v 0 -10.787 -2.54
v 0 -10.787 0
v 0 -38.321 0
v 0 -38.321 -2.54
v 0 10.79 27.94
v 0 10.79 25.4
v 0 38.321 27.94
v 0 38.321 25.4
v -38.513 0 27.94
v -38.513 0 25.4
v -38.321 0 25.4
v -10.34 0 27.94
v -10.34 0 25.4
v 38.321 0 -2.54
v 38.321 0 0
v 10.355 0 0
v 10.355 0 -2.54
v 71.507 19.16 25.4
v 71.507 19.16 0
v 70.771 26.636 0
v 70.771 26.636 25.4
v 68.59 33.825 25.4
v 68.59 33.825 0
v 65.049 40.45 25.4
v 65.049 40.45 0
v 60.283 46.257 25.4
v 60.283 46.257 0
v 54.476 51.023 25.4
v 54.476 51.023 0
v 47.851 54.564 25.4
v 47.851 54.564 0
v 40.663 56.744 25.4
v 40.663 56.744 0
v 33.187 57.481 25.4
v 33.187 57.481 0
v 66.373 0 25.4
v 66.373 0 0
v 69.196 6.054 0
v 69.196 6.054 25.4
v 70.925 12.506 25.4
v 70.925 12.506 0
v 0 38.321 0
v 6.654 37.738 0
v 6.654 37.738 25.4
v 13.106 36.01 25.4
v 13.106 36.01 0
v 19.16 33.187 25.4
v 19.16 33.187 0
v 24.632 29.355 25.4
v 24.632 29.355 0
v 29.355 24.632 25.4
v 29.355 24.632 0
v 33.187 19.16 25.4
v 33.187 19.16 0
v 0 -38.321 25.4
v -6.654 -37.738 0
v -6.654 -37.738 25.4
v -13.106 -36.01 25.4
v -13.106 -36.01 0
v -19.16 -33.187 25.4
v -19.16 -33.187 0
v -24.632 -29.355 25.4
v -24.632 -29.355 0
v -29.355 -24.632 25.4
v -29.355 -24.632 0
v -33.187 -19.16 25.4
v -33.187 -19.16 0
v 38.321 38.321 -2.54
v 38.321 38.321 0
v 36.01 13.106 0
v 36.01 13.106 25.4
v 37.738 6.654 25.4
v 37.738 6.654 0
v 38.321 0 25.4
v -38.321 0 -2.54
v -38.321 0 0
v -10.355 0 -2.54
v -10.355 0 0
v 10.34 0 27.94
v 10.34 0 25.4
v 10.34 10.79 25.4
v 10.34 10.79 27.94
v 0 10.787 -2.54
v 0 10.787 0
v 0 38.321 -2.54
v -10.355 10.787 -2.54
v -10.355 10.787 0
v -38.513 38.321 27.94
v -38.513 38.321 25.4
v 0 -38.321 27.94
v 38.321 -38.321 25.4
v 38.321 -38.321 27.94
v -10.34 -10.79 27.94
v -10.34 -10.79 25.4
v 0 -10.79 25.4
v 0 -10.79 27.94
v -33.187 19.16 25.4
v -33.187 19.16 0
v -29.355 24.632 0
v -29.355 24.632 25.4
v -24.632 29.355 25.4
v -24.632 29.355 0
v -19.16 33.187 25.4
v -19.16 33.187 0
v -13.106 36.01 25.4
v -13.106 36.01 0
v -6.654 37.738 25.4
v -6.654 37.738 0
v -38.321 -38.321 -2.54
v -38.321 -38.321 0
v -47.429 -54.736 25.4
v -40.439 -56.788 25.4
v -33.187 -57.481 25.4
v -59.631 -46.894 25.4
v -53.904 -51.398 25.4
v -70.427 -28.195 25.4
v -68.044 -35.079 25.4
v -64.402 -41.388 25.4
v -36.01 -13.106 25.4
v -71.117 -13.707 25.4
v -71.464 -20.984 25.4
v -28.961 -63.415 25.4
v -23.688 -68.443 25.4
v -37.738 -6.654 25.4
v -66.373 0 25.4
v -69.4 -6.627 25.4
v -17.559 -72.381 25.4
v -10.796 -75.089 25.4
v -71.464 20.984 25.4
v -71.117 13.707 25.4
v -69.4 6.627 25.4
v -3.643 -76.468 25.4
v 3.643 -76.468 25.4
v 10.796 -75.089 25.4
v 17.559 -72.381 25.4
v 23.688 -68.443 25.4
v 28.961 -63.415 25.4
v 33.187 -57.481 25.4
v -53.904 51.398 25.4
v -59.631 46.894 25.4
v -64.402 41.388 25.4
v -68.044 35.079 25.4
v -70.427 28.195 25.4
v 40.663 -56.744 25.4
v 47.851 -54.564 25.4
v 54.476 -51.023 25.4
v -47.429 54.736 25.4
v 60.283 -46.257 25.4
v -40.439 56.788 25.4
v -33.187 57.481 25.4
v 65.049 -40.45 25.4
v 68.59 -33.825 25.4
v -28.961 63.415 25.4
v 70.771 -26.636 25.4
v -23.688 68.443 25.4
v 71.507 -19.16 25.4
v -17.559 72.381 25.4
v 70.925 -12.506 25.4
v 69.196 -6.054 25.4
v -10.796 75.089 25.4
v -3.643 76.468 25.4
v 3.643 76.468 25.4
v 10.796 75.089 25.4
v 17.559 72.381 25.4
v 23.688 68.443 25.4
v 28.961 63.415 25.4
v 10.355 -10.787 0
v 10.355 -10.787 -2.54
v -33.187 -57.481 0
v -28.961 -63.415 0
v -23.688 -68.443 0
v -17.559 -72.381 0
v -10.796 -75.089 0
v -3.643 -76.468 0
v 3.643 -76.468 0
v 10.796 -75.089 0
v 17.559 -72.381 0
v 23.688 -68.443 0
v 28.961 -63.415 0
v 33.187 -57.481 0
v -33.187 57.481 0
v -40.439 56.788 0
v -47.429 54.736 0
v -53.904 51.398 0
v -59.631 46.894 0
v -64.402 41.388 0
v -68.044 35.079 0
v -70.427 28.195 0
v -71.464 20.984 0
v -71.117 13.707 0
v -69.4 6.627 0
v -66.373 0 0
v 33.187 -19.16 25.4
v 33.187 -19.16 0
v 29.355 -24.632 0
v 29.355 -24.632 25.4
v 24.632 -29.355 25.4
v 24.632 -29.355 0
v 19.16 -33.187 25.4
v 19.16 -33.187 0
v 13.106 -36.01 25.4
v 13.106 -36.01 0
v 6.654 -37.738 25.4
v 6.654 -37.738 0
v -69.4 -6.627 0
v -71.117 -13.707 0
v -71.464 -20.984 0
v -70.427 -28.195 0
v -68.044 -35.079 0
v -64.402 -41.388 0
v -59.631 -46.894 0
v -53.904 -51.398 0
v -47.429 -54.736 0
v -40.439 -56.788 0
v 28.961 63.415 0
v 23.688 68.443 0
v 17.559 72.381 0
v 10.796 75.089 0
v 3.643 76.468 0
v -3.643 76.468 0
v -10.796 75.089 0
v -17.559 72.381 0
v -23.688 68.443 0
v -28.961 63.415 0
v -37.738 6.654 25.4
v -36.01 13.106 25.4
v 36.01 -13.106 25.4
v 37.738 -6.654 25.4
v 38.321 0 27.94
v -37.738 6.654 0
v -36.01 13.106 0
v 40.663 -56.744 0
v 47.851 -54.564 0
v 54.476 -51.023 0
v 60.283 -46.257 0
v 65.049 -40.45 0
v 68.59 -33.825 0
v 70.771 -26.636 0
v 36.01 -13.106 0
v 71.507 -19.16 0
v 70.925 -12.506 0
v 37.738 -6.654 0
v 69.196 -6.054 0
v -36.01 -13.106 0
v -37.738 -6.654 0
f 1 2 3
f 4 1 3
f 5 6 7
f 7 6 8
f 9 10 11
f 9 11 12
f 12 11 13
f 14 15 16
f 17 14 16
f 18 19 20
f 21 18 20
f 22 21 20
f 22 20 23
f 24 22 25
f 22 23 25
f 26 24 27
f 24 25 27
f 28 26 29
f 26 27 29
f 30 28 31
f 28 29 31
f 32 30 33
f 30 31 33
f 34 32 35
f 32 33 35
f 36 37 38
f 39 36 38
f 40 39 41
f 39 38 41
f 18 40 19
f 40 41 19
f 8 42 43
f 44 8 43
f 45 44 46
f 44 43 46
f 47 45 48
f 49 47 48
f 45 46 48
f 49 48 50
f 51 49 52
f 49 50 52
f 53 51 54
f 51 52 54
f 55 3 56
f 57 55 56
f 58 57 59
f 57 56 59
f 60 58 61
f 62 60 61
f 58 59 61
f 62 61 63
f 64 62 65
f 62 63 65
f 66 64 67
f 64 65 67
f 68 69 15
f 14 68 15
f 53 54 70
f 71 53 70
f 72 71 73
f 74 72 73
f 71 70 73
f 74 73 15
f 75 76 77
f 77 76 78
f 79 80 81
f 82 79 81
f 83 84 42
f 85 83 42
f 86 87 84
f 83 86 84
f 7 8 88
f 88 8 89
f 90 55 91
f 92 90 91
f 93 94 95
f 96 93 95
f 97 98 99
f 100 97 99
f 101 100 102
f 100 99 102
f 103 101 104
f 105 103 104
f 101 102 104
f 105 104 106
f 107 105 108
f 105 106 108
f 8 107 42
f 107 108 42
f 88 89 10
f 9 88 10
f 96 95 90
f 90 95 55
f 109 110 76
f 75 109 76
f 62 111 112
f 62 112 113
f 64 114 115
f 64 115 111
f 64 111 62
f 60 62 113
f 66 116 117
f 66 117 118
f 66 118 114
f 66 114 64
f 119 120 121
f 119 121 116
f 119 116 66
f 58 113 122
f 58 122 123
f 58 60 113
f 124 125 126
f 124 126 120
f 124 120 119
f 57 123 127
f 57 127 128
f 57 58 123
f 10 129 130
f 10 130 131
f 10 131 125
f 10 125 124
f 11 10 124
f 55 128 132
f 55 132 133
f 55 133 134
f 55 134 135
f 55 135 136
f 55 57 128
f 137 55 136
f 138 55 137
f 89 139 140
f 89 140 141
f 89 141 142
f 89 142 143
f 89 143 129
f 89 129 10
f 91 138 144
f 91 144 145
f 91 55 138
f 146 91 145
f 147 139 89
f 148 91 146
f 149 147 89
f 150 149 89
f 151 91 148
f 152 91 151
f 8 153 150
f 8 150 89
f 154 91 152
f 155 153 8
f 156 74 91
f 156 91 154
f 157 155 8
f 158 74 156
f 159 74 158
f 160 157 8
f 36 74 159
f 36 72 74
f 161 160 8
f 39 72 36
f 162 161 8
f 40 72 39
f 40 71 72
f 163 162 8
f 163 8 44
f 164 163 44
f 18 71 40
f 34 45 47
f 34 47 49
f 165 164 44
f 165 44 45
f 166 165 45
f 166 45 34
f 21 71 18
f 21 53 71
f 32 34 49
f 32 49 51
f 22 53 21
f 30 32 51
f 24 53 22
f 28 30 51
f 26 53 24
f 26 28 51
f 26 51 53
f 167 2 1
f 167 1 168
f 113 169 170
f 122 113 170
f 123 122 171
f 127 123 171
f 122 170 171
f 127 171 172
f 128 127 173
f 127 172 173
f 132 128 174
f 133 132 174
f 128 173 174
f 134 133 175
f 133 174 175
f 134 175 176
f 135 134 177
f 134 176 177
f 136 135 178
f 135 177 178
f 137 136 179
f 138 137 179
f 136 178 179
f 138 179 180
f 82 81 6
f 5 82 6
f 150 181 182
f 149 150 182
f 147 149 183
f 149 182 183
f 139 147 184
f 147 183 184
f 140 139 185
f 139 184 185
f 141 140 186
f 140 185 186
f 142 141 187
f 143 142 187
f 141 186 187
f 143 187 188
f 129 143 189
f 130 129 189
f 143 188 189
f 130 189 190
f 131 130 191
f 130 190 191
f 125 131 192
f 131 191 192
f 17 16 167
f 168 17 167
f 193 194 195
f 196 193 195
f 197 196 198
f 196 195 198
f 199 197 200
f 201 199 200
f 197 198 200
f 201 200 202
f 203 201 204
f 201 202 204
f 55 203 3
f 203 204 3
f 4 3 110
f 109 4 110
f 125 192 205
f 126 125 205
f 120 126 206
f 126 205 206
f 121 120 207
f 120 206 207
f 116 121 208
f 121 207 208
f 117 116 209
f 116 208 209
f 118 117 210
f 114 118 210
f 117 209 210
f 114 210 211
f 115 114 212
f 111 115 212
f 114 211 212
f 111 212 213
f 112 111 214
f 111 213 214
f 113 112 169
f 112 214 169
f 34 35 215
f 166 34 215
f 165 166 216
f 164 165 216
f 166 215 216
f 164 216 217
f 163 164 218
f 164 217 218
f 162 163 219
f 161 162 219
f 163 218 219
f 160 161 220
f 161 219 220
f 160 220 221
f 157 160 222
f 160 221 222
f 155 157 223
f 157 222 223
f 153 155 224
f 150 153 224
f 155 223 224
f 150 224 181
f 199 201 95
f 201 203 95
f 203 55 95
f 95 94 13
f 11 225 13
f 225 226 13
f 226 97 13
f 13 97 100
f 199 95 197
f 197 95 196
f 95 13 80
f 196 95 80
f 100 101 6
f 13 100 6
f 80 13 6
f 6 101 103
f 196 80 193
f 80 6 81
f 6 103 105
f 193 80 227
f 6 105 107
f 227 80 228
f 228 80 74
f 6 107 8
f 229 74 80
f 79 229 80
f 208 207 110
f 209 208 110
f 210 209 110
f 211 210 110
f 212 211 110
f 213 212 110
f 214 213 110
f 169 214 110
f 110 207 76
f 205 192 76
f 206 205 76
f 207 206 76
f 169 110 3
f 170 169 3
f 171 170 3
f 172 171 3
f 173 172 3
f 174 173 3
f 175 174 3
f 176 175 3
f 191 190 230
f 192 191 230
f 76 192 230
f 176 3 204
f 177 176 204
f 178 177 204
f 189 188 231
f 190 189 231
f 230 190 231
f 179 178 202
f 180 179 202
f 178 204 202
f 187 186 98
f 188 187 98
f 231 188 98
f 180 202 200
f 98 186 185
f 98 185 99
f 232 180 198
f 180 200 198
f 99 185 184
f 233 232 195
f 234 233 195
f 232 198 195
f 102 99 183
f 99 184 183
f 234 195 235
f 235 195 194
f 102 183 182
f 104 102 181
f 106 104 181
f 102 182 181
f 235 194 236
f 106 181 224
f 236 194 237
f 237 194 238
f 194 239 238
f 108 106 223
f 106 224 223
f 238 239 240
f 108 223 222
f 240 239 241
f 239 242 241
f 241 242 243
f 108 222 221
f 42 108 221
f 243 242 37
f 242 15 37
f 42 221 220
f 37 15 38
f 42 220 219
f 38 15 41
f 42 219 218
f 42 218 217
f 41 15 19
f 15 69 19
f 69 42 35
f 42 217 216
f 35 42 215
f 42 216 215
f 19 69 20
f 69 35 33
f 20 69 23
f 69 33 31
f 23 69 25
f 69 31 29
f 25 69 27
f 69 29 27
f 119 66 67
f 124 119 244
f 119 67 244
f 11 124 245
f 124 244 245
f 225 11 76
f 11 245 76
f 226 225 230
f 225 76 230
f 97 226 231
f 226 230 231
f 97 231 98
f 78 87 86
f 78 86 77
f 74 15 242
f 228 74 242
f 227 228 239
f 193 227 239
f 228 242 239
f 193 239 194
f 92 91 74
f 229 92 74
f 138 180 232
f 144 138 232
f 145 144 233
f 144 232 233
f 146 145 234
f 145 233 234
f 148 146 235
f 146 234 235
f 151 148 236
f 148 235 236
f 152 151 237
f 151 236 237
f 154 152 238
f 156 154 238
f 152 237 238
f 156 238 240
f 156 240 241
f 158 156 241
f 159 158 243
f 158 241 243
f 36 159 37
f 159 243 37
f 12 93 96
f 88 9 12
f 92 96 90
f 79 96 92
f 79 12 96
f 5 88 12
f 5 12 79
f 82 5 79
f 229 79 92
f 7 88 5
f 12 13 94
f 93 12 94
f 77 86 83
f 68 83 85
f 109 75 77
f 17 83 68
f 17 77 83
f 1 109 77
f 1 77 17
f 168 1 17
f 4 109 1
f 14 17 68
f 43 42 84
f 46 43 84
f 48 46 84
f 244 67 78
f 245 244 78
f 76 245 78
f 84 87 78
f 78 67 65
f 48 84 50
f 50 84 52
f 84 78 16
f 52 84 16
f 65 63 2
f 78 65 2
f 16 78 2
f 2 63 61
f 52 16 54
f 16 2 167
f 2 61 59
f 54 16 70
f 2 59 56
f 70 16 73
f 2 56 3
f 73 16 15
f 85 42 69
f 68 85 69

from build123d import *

# Parameters (mm, degrees)
F1_DEPTH = 25.4
F2_W     = 10.3401243687
F2_H     = 10.7896951959
F3_DEPTH = 2.54
F4_W     = 10.3547675535
F4_H     = 10.7866246253
F5_DEPTH = 2.54


with BuildPart() as f1:
    # F0 (on Top) → F1 (new body)
    with BuildSketch(Plane.XY):
        with BuildLine():
            ThreePointArc((33.1865631623, 19.1602711752), (37.0148015337, 9.918086179), (38.3205423505, 0))
            ThreePointArc((38.3205423505, 0), (37.0148015337, -9.918086179), (33.1865631623, -19.1602711752))
            ThreePointArc((33.1865631623, -19.1602711752), (52.3468343375, -14.0262919871), (66.3731263246, 0))
            ThreePointArc((66.3731263246, 0), (52.3468343375, 14.0262919871), (33.1865631623, 19.1602711752))
        make_face()
        with BuildLine():
            ThreePointArc((0, 38.3205423505), (19.1602711752, 33.1865631623), (33.1865631623, 19.1602711752))
            ThreePointArc((33.1865631623, 19.1602711752), (37.0148015337, 28.4024561715), (38.3205423505, 38.3205423505))
            ThreePointArc((38.3205423505, 38.3205423505), (37.0148015337, 48.2386285294), (33.1865631623, 57.4808135257))
            ThreePointArc((33.1865631623, 57.4808135257), (14.0262919871, 52.3468343375), (0, 38.3205423505))
        make_face()
        with BuildLine():
            ThreePointArc((38.3205423505, 38.3205423505), (37.0148015337, 28.4024561715), (33.1865631623, 19.1602711752))
            ThreePointArc((33.1865631623, 19.1602711752), (52.3468343375, 14.0262919871), (66.3731263246, 0))
            ThreePointArc((66.3731263246, 0), (70.201364696, 9.2421849963), (71.5071055127, 19.1602711752))
            ThreePointArc((71.5071055127, 19.1602711752), (60.283278517, 46.25698653), (33.1865631623, 57.4808135257))
            ThreePointArc((33.1865631623, 57.4808135257), (37.0148015337, 48.2386285294), (38.3205423505, 38.3205423505))
        make_face()
        with BuildLine():
            ThreePointArc((38.3205423505, -38.3205423505), (37.0148015337, -28.4024561715), (33.1865631623, -19.1602711752))
            ThreePointArc((33.1865631623, -19.1602711752), (19.1602711752, -33.1865631623), (0, -38.3205423505))
            ThreePointArc((0, -38.3205423505), (14.0262919871, -52.3468343375), (33.1865631623, -57.4808135257))
            ThreePointArc((33.1865631623, -57.4808135257), (37.0148015337, -48.2386285294), (38.3205423505, -38.3205423505))
        make_face()
        with BuildLine():
            ThreePointArc((66.3731263246, 0), (52.3468343375, -14.0262919871), (33.1865631623, -19.1602711752))
            ThreePointArc((33.1865631623, -19.1602711752), (37.0148015337, -28.4024561715), (38.3205423505, -38.3205423505))
            ThreePointArc((38.3205423505, -38.3205423505), (37.0148015337, -48.2386285294), (33.1865631623, -57.4808135257))
            ThreePointArc((33.1865631623, -57.4808135257), (60.283278517, -46.25698653), (71.5071055127, -19.1602711752))
            ThreePointArc((71.5071055127, -19.1602711752), (70.201364696, -9.2421849963), (66.3731263246, 0))
        make_face()
        with BuildLine():
            ThreePointArc((-33.1865631623, 57.4808135257), (-14.0262919871, 52.3468343375), (0, 38.3205423505))
            ThreePointArc((0, 38.3205423505), (14.0262919871, 52.3468343375), (33.1865631623, 57.4808135257))
            ThreePointArc((33.1865631623, 57.4808135257), (0, 76.6410847009), (-33.1865631623, 57.4808135257))
        make_face()
        with BuildLine():
            ThreePointArc((-33.1865631623, 19.1602711752), (-19.1602711752, 33.1865631623), (0, 38.3205423505))
            ThreePointArc((0, 38.3205423505), (-14.0262919871, 52.3468343375), (-33.1865631623, 57.4808135257))
            ThreePointArc((-33.1865631623, 57.4808135257), (-38.3205423505, 38.3205423505), (-33.1865631623, 19.1602711752))
        make_face()
        with BuildLine():
            ThreePointArc((-33.1865631623, -57.4808135257), (-14.0262919871, -52.3468343375), (0, -38.3205423505))
            ThreePointArc((0, -38.3205423505), (-19.1602711752, -33.1865631623), (-33.1865631623, -19.1602711752))
            ThreePointArc((-33.1865631623, -19.1602711752), (-38.3205423505, -38.3205423505), (-33.1865631623, -57.4808135257))
        make_face()
        with BuildLine():
            ThreePointArc((33.1865631623, -57.4808135257), (14.0262919871, -52.3468343375), (0, -38.3205423505))
            ThreePointArc((0, -38.3205423505), (-14.0262919871, -52.3468343375), (-33.1865631623, -57.4808135257))
            ThreePointArc((-33.1865631623, -57.4808135257), (0, -76.6410847009), (33.1865631623, -57.4808135257))
        make_face()
        with BuildLine():
            ThreePointArc((-66.3731263246, 0), (-52.3468343375, 14.0262919871), (-33.1865631623, 19.1602711752))
            ThreePointArc((-33.1865631623, 19.1602711752), (-38.3205423505, 38.3205423505), (-33.1865631623, 57.4808135257))
            ThreePointArc((-33.1865631623, 57.4808135257), (-66.3731263246, 38.3205423505), (-66.3731263246, 0))
        make_face()
        with BuildLine():
            ThreePointArc((-33.1865631623, -19.1602711752), (-38.3205423505, 0), (-33.1865631623, 19.1602711752))
            ThreePointArc((-33.1865631623, 19.1602711752), (-52.3468343375, 14.0262919871), (-66.3731263246, 0))
            ThreePointArc((-66.3731263246, 0), (-52.3468343375, -14.0262919871), (-33.1865631623, -19.1602711752))
        make_face()
        with BuildLine():
            ThreePointArc((-33.1865631623, -57.4808135257), (-38.3205423505, -38.3205423505), (-33.1865631623, -19.1602711752))
            ThreePointArc((-33.1865631623, -19.1602711752), (-52.3468343375, -14.0262919871), (-66.3731263246, 0))
            ThreePointArc((-66.3731263246, 0), (-66.3731263246, -38.3205423505), (-33.1865631623, -57.4808135257))
        make_face()
    extrude(amount=F1_DEPTH)

    # F2 (on face) → F3 (join)
    with BuildSketch(Plane.XY.offset(25.4)):
        with Locations((-5.1700621843, -5.3948475979)):
            Rectangle(F2_W, F2_H)
        with Locations((-5.1700621843, 5.3948475979)):
            Rectangle(F2_W, F2_H)
        with Locations((5.1700621843, 5.3948475979)):
            Rectangle(F2_W, F2_H)
        with Locations((5.1700621843, -5.3948475979)):
            Rectangle(F2_W, F2_H)
        Polygon((-38.5132133961, 0), (-10.3401243687, 0), (-10.3401243687, 10.7896951959), (0, 10.7896951959), (0, 38.3205423505), (-38.5132133961, 38.3205423505), align=None)
        Polygon((38.3205423505, 0), (10.3401243687, 0), (10.3401243687, -10.7896951959), (0, -10.7896951959), (0, -38.3205423505), (38.3205423505, -38.3205423505), align=None)
    extrude(amount=F3_DEPTH)

    # F4 (on face) → F5 (join)
    with BuildSketch(Plane(origin=(0, 0, 0), x_dir=(1, 0, 0), z_dir=(0, 0, -1))):
        Polygon((0, 10.7866246253), (0, 38.3205423505), (-38.3205423505, 38.3205423505), (-38.3205423505, 0), (-10.3547675535, 0), (-10.3547675535, 10.7866246253), align=None)
        with Locations((5.1773837768, 5.3933123127)):
            Rectangle(F4_W, F4_H)
        with Locations((-5.1773837768, 5.3933123127)):
            Rectangle(F4_W, F4_H)
        with Locations((-5.1773837768, -5.3933123127)):
            Rectangle(F4_W, F4_H)
        with Locations((5.1773837768, -5.3933123127)):
            Rectangle(F4_W, F4_H)
        Polygon((38.3205423505, 0), (10.3547675535, 0), (10.3547675535, -10.7866246253), (0, -10.7866246253), (0, -38.3205423505), (38.3205423505, -38.3205423505), align=None)
    extrude(amount=F5_DEPTH)


solid = f1.part
